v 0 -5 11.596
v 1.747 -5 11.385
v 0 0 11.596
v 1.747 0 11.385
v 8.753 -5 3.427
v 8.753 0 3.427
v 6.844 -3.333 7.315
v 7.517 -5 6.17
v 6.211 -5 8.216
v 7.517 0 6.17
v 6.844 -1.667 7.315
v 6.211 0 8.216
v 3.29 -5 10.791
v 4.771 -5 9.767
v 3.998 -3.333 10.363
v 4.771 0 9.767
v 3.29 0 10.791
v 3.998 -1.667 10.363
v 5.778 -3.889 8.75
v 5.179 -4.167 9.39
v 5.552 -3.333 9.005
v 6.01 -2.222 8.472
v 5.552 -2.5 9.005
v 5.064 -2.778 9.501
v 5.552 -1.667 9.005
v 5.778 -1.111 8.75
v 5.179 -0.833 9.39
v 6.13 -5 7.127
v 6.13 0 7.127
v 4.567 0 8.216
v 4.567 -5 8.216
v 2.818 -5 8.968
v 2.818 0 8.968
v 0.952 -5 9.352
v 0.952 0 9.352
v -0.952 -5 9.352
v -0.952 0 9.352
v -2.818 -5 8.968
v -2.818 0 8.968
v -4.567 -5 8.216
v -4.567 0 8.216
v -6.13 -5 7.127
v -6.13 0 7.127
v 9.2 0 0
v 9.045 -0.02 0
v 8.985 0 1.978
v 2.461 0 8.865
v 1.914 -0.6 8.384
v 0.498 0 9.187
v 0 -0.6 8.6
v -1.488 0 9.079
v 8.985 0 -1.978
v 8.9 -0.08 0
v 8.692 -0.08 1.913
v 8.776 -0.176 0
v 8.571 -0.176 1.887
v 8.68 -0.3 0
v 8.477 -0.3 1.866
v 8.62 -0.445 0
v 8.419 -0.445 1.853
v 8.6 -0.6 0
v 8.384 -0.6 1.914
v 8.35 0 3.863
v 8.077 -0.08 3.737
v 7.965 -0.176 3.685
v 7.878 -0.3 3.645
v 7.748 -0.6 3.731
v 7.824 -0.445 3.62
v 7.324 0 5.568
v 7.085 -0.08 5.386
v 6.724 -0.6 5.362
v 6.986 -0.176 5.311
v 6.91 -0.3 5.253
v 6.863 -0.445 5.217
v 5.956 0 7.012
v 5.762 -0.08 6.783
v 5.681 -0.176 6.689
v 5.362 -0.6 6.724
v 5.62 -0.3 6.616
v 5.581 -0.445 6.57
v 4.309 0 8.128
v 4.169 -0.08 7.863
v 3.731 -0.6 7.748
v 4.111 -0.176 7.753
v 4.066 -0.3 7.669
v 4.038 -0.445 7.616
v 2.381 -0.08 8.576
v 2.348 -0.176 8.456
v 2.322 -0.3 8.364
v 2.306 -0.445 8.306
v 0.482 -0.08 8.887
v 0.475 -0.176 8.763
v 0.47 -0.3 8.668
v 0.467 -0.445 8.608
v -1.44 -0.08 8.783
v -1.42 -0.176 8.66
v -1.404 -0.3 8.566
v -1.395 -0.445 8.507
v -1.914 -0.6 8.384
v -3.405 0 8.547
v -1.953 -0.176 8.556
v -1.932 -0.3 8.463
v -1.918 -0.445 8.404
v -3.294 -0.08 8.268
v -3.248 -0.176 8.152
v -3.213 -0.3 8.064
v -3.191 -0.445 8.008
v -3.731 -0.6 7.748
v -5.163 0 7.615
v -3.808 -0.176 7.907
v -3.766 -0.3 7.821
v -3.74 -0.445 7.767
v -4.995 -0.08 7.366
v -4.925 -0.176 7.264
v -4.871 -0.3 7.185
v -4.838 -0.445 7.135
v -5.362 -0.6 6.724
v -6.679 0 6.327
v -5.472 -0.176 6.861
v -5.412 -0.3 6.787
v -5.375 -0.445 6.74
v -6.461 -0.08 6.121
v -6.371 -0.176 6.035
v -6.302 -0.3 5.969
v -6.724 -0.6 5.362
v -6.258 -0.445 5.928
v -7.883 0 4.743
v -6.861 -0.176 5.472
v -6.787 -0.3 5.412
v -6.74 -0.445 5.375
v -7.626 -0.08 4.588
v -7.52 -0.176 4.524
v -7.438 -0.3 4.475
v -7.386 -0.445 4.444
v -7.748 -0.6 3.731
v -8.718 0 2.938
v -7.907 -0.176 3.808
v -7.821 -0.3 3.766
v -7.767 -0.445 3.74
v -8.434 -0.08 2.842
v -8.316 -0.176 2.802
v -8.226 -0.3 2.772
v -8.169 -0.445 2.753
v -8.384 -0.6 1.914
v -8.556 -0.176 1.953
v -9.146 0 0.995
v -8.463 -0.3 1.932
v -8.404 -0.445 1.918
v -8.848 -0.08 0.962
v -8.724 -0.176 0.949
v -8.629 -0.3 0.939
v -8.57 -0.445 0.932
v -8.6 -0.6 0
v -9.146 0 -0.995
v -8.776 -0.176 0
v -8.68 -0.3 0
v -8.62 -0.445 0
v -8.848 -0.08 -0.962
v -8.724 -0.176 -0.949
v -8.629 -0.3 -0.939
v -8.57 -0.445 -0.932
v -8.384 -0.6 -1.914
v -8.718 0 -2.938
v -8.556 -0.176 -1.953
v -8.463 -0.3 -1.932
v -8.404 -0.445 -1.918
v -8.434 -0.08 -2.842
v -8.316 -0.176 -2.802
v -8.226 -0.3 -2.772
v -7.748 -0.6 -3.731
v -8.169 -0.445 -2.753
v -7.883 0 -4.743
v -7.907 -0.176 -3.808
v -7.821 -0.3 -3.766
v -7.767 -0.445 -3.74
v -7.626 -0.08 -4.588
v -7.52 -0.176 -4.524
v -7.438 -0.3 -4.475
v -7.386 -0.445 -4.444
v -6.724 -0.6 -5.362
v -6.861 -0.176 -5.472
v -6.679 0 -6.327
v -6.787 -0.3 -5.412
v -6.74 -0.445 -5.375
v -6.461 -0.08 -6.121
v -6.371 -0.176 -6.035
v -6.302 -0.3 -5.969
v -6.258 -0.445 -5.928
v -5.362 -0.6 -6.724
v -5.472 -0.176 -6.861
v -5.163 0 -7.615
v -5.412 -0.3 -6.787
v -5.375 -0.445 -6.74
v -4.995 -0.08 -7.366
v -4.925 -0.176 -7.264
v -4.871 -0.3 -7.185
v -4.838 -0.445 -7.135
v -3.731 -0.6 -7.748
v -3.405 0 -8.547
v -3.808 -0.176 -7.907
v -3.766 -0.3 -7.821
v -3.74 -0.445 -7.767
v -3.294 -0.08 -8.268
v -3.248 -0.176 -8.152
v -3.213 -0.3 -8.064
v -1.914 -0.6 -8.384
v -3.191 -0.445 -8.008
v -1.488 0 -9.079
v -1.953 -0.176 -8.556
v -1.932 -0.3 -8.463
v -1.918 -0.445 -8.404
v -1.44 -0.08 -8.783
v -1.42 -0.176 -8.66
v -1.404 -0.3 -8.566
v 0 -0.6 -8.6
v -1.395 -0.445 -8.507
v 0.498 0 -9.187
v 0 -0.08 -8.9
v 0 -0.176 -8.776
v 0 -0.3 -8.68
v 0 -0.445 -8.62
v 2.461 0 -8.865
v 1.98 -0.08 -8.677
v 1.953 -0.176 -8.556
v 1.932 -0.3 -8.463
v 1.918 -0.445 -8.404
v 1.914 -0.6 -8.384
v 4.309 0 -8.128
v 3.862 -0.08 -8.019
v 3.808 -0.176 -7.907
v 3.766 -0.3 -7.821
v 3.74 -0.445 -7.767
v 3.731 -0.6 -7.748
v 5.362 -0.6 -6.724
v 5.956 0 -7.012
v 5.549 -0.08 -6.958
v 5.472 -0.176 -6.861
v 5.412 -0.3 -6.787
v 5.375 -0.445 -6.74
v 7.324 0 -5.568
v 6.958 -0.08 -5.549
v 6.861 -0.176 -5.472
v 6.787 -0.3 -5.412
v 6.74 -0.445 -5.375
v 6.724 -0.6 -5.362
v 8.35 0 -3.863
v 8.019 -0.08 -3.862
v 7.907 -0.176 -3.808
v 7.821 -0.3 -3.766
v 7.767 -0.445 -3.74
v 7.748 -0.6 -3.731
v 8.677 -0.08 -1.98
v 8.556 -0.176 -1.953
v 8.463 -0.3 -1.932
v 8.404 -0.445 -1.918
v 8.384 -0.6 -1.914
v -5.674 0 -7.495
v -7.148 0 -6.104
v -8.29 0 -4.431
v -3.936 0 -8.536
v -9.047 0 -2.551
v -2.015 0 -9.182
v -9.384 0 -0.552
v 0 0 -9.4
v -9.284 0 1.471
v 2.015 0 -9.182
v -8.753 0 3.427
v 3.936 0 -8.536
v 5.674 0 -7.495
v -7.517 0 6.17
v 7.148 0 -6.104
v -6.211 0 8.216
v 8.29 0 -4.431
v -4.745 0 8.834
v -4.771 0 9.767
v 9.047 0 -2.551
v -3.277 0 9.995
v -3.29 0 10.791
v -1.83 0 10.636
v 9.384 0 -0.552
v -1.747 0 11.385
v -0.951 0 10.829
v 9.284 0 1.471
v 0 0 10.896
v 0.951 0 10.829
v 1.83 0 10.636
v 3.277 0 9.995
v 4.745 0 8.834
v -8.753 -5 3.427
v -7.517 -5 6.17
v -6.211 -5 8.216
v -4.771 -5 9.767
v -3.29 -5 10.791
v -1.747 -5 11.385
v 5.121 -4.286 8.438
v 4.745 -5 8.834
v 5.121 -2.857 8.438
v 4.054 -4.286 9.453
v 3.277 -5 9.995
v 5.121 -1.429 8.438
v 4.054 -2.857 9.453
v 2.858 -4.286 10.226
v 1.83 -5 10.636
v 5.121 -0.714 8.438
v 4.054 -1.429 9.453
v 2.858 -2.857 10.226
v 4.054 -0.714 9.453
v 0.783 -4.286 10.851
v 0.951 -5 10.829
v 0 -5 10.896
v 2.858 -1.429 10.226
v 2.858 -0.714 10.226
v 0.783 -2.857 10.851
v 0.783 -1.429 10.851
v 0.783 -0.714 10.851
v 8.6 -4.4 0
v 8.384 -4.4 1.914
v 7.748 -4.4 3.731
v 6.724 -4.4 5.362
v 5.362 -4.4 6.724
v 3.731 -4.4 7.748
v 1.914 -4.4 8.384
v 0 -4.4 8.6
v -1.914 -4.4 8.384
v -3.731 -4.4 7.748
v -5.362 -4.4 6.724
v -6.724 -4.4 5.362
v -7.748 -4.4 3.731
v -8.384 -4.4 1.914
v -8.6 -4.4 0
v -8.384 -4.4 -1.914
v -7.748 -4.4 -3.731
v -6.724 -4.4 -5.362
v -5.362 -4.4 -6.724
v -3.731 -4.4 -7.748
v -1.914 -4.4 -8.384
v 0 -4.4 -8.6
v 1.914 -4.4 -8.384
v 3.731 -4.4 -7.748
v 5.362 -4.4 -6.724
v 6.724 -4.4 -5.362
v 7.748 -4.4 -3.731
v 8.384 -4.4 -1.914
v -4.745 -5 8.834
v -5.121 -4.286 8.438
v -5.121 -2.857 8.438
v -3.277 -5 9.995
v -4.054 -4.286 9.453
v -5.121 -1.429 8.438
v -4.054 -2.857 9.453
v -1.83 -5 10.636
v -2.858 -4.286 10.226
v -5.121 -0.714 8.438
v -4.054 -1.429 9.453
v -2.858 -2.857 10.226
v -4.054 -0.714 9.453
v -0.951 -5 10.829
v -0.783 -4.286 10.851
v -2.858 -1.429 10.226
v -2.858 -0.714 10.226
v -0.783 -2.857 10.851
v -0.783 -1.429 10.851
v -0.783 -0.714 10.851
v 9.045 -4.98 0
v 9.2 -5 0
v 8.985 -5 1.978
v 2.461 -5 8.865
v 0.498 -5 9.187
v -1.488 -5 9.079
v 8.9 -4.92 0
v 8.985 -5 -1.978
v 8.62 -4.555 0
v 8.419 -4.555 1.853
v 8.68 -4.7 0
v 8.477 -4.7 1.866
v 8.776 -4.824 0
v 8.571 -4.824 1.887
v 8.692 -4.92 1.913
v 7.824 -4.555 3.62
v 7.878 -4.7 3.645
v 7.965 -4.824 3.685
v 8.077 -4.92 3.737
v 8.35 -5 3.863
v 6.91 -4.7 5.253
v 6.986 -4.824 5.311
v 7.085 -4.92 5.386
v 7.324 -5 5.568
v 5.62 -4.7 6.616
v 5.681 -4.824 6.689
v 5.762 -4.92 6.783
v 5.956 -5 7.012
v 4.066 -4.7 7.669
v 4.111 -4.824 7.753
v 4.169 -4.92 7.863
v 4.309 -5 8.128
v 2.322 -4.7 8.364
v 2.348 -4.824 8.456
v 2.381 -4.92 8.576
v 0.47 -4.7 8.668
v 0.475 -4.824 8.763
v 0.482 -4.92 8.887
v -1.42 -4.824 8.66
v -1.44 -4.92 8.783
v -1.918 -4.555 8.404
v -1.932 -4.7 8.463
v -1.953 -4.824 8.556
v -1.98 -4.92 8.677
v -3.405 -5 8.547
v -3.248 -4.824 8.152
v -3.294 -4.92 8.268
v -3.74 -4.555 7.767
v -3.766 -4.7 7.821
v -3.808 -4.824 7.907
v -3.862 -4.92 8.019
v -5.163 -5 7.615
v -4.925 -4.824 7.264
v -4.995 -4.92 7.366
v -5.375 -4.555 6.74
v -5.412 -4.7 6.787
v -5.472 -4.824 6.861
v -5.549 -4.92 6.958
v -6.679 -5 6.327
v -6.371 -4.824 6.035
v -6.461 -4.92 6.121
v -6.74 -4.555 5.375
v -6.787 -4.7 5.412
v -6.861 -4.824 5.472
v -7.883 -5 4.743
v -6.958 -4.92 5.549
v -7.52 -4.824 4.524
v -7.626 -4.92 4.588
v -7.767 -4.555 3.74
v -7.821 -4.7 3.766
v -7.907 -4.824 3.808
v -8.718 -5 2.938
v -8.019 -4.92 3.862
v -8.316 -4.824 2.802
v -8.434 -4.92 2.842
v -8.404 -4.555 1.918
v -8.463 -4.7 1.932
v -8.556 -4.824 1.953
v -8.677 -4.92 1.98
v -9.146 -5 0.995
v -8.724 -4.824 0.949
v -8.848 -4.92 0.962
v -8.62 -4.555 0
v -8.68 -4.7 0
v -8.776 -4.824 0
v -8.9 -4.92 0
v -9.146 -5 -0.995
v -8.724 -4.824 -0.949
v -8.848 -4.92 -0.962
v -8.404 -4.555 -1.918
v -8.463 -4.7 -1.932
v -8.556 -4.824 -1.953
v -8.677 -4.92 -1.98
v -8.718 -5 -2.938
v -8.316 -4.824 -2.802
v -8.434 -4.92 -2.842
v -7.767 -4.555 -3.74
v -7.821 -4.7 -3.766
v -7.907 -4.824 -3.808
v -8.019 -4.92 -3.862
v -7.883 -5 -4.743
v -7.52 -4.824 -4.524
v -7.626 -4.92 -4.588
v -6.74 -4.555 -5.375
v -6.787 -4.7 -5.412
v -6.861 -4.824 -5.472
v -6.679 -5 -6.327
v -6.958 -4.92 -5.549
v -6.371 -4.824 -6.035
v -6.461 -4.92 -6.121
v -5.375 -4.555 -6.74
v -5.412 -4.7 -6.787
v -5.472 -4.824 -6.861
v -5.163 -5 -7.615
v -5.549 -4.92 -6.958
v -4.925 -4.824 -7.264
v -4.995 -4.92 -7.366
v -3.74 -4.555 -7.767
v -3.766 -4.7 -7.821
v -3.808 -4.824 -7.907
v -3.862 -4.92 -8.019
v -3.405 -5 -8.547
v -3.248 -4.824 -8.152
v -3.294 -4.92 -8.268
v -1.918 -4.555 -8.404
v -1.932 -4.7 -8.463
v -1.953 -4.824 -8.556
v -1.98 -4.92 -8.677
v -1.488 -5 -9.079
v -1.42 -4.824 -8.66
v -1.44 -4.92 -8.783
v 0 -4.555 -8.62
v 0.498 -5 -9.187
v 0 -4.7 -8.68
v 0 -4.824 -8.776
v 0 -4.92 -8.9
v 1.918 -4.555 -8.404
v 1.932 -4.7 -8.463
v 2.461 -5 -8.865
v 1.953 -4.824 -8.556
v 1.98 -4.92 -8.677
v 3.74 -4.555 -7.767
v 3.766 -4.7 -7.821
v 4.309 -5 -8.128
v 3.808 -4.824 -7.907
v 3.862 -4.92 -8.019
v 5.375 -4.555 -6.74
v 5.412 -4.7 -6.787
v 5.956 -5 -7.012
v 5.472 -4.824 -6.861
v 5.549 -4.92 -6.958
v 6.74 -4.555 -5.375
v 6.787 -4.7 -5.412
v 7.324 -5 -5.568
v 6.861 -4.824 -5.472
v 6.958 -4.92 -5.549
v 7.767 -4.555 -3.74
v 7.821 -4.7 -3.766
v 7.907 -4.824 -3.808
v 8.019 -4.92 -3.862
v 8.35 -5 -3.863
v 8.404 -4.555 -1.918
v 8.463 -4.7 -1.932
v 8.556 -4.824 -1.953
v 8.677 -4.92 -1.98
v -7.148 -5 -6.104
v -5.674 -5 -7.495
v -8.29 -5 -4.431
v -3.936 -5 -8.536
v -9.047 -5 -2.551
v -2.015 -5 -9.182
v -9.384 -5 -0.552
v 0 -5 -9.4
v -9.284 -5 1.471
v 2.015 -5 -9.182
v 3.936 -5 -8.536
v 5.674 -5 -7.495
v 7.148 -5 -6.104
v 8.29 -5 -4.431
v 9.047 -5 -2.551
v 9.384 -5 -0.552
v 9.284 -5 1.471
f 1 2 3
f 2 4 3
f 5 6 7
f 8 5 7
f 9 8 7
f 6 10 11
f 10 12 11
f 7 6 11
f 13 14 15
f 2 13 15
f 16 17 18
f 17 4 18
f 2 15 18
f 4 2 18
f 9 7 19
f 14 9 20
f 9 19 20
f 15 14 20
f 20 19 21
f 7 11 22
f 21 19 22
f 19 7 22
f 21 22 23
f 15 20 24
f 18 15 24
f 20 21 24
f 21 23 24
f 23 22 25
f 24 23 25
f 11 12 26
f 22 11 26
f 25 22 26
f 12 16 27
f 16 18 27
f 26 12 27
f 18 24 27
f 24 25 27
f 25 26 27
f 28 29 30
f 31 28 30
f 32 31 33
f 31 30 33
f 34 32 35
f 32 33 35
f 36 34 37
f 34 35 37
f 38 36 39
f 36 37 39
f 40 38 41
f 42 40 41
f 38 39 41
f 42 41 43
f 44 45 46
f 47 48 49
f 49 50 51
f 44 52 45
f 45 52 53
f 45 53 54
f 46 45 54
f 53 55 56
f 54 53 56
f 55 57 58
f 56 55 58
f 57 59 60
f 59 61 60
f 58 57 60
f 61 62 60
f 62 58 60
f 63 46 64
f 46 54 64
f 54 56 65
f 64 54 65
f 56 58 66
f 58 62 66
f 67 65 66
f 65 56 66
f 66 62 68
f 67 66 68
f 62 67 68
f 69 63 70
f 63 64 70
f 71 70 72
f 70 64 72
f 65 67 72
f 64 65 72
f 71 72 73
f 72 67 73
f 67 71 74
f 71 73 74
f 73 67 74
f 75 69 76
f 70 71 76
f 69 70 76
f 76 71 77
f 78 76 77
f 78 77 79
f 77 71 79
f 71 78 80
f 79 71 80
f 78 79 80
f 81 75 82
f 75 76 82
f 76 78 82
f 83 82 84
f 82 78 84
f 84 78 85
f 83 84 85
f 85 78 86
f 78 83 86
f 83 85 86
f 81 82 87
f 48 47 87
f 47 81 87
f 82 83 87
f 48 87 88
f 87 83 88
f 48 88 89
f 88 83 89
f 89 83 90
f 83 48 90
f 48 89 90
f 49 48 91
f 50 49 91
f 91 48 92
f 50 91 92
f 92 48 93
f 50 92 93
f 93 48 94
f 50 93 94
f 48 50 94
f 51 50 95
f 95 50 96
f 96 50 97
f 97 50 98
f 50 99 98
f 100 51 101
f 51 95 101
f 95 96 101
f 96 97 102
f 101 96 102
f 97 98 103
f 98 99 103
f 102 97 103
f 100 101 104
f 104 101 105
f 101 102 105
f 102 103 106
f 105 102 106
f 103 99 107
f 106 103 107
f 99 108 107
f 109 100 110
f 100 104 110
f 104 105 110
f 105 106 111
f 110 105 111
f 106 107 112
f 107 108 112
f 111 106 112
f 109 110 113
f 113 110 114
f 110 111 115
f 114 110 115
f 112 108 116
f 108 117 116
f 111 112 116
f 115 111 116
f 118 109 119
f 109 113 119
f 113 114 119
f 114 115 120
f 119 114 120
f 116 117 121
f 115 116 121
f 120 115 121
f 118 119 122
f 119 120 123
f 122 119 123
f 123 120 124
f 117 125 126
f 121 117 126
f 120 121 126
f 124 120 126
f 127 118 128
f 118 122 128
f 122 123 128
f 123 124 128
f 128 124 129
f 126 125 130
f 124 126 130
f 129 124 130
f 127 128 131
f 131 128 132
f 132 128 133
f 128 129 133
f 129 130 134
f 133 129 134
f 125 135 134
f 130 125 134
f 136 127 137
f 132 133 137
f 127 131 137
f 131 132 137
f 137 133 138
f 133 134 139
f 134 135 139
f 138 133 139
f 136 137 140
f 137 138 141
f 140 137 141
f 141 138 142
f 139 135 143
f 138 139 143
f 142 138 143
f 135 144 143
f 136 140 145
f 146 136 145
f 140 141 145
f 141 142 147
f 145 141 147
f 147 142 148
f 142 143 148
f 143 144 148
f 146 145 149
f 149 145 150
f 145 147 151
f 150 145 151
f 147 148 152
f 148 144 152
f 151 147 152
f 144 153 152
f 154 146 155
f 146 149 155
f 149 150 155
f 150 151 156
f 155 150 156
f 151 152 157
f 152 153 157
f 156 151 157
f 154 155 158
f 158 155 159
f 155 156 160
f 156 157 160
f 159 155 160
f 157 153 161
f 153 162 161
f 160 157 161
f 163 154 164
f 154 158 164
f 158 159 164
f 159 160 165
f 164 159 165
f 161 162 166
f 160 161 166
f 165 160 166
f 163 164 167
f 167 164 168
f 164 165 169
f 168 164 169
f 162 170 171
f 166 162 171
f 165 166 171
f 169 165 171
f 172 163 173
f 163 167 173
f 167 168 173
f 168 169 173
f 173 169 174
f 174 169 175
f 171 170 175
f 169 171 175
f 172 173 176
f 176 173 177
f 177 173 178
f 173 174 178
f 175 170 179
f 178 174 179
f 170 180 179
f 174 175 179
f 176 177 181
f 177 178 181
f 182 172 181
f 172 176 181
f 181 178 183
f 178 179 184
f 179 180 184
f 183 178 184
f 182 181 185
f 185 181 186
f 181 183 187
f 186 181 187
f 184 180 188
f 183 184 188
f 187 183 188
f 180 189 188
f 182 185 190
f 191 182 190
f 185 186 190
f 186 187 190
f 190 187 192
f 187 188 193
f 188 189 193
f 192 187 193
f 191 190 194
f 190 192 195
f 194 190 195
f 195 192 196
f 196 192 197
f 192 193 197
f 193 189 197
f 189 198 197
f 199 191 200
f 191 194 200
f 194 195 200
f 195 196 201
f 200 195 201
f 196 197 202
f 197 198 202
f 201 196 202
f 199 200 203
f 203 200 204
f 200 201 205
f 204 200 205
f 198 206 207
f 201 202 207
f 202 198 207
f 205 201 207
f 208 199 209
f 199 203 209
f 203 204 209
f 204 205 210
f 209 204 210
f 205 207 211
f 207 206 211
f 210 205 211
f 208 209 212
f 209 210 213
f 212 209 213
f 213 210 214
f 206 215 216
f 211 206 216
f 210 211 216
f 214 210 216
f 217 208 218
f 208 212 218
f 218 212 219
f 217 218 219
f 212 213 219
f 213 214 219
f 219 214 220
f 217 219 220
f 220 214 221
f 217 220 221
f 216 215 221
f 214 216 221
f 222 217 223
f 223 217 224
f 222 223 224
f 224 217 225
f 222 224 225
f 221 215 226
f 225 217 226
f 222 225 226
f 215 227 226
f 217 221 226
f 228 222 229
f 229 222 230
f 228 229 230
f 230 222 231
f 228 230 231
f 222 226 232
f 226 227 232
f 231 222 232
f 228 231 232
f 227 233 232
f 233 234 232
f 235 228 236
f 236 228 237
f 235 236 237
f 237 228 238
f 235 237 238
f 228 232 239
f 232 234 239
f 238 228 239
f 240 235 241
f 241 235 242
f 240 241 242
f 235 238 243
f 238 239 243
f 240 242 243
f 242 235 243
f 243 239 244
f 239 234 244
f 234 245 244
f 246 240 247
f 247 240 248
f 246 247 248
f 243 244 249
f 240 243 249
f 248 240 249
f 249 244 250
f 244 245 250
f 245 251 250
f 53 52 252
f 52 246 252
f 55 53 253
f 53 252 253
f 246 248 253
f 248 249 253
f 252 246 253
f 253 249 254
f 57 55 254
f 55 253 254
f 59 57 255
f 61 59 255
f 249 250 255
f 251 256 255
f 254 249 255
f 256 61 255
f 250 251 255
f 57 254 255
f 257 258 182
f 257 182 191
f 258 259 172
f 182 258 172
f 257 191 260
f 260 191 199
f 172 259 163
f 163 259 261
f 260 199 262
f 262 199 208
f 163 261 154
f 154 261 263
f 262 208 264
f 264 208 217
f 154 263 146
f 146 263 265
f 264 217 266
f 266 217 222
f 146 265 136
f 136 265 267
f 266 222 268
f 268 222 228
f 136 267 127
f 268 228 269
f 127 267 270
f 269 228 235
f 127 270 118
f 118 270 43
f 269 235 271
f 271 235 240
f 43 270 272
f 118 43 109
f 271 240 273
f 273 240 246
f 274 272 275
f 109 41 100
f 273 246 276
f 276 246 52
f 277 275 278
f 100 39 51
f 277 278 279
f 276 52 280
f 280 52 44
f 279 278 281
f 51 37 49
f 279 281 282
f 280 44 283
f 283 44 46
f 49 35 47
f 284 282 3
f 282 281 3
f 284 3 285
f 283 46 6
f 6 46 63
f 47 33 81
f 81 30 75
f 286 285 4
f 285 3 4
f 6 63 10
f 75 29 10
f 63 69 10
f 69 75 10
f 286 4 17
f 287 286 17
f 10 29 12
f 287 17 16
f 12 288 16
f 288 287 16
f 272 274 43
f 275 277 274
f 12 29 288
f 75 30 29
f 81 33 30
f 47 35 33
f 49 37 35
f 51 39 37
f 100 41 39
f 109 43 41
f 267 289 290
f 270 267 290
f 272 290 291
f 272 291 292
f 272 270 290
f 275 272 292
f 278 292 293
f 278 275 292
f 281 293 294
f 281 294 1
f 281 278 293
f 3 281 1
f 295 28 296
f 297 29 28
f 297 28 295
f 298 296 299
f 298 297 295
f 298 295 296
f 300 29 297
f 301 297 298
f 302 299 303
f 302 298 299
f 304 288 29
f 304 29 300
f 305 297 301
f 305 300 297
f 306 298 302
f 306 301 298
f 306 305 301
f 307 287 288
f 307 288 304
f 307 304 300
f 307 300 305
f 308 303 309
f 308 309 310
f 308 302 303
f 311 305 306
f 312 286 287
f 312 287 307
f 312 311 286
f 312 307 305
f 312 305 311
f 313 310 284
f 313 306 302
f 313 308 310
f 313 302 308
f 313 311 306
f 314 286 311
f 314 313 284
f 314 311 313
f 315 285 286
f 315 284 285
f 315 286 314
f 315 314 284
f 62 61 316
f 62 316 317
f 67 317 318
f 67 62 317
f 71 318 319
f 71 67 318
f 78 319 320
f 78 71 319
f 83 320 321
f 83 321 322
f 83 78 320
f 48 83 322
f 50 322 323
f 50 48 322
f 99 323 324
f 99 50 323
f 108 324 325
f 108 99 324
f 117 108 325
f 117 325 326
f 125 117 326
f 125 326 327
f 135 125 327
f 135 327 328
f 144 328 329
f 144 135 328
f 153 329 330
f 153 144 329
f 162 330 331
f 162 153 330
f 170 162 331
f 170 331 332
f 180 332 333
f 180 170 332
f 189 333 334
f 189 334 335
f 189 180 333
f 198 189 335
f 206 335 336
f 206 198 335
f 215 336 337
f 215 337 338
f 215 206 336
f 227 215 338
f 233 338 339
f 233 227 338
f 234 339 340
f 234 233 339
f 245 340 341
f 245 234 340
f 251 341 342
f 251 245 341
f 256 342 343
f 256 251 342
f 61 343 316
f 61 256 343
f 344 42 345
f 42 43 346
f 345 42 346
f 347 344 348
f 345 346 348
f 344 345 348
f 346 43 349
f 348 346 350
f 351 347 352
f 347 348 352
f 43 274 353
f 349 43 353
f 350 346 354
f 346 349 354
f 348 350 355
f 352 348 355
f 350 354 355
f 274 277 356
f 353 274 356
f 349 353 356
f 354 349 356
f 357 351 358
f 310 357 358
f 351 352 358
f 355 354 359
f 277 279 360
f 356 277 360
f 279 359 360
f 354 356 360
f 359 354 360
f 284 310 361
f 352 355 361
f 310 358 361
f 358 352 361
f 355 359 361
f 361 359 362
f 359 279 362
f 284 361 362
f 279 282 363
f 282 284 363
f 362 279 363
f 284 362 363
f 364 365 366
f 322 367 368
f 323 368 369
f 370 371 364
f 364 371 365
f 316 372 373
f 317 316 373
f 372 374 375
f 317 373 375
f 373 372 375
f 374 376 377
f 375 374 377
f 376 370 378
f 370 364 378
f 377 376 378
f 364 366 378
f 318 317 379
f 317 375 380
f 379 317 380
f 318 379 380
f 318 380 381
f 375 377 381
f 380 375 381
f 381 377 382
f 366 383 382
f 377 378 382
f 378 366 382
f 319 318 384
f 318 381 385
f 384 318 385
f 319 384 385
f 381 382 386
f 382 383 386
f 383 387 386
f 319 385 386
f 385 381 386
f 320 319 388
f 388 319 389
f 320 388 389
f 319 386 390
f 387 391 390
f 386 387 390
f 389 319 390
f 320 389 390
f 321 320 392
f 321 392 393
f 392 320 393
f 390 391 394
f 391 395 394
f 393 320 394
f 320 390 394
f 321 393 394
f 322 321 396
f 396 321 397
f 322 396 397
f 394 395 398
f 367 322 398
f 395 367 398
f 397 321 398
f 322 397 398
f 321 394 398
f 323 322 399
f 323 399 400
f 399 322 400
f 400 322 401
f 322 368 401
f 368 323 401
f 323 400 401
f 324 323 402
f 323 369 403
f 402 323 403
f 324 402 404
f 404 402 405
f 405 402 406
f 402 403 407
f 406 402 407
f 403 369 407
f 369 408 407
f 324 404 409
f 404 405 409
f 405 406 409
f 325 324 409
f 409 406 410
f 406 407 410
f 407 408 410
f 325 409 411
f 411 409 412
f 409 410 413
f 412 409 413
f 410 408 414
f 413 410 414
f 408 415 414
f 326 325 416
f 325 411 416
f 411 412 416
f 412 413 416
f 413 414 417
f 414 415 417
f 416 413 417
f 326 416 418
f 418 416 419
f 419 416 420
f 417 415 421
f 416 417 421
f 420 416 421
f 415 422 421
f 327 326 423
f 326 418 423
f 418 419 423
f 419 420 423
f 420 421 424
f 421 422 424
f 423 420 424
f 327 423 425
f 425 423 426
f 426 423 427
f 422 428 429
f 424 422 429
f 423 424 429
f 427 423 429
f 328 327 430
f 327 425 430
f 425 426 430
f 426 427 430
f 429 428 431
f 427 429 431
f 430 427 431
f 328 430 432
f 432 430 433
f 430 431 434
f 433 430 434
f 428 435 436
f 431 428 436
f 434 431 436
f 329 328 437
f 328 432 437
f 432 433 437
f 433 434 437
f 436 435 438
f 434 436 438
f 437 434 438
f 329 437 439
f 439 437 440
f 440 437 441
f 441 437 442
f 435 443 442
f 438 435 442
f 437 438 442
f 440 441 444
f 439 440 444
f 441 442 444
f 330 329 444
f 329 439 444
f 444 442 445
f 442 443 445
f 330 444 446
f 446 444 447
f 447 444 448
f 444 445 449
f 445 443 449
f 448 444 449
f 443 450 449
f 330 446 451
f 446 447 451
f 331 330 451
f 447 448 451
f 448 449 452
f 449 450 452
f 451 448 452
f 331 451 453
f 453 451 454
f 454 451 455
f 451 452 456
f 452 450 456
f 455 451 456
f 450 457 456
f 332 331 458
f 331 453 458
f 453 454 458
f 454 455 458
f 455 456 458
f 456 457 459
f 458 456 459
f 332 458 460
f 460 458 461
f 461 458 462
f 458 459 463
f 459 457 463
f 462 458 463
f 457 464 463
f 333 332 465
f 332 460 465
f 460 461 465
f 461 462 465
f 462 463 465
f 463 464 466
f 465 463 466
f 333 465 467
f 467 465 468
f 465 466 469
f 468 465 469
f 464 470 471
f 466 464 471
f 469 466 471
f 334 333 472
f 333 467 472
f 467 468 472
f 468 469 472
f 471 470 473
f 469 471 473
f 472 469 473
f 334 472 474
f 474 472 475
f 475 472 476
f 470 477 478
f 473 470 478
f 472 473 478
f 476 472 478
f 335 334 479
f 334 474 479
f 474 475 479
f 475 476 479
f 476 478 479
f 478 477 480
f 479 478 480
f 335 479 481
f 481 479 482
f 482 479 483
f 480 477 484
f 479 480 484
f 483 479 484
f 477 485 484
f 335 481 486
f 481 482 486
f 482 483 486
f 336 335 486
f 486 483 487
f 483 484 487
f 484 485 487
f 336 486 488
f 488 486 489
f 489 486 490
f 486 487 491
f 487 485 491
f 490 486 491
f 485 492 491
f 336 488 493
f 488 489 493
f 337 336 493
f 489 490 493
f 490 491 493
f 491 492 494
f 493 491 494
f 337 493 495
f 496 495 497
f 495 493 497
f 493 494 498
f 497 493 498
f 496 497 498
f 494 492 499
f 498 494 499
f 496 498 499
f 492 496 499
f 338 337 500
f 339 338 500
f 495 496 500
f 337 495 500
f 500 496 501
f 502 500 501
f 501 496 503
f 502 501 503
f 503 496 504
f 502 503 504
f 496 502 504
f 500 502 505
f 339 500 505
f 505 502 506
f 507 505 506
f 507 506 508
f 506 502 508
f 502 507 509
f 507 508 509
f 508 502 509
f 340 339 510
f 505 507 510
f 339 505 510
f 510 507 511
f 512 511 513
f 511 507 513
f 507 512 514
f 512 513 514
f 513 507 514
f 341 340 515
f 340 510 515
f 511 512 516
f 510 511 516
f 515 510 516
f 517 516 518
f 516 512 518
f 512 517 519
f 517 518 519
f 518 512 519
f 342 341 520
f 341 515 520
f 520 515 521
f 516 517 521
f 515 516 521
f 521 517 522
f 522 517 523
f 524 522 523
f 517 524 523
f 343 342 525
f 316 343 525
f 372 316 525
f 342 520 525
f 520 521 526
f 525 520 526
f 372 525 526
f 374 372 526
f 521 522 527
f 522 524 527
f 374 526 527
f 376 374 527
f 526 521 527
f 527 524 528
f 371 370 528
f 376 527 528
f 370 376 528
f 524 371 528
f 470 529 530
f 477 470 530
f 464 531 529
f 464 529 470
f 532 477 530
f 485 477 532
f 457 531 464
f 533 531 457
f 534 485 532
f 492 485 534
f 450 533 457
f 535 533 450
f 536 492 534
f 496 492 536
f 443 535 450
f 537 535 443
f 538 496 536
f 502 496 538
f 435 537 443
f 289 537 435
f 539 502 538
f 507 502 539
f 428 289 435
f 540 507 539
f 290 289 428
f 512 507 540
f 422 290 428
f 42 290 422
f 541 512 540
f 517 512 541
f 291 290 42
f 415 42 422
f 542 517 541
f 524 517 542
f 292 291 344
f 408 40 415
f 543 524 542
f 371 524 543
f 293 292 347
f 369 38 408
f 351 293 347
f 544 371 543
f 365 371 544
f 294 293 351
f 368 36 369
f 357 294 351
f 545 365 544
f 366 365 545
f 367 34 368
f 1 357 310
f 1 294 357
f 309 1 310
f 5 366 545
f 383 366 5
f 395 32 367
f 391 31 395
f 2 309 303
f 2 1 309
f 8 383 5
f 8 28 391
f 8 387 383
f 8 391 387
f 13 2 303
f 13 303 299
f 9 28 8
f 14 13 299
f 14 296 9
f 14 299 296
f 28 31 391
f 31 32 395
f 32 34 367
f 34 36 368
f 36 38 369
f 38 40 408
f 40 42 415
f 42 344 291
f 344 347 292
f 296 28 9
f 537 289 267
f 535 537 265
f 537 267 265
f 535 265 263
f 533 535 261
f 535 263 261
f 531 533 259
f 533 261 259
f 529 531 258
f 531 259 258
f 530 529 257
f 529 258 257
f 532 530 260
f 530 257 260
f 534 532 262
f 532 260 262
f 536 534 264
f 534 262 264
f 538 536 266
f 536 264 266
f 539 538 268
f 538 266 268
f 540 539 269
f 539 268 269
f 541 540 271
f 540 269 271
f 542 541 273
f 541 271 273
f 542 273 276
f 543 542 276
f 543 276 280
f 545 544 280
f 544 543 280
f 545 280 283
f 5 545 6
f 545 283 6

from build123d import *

# Parameters (mm, degrees)
F0_R     = 9.4
F0_R_2   = 8.6
F1_DEPTH = 5
F3_DEPTH = 5
F4_R     = 0.6


# Not quite as in the source:
# - the dataset's text gives a spline's control points without its knots; the knots are read off the source's solid


with BuildPart() as f1:
    # F0 (on Front) → F1 (new body)
    with BuildSketch(Plane.XZ):
        Circle(F0_R)
        Circle(F0_R_2, mode=Mode.SUBTRACT)
    extrude(amount=F1_DEPTH)

    # F2 (on Front) → F3 (join)
    with BuildSketch(Plane.XZ):
        with BuildLine():
            add(Edge.make_bspline(
                [(-8.8490276873, 3.1709161121), (-7.3496829409, 7.2272375548), (-4.746891386, 11.5964177027), (3.78631e-05, 11.5964002776), (5.67948e-05, 11.5964002775)],
                knots=[0, 0, 0, 0, 0.5, 0.5000019941, 0.5000019941, 0.5000019941, 0.5000019941], degree=3))
            Line((-8.8490276873, 3.1709161121), (-8.1924457198, 2.9282226429))
            add(Edge.make_bspline(
                [(-8.1924457198, 2.9282226429), (-7.8262756691, 3.9188576733), (-6.9626502108, 5.9278467604), (-5.4967702335, 8.1305819439), (-4.0755610615, 9.4931807293), (-2.8820227839, 10.2720641504), (-1.7694285607, 10.6893985819), (-0.7912754674, 10.8653850416), (-0.2703531008, 10.896417707), (0, 10.8964002777)],
                knots=[0, 0, 0, 0, 0.125, 0.25, 0.3125, 0.375, 0.4375, 0.46875, 0.5, 0.5, 0.5, 0.5], degree=3))
            add(Edge.make_bspline(
                [(8.1924457198, 2.9282226429), (7.8262756691, 3.9188576733), (6.9626502108, 5.9278467604), (5.4967702335, 8.1305819439), (4.0755610615, 9.4931807293), (2.8820227839, 10.2720641504), (1.7694285607, 10.6893985819), (0.7912754674, 10.8653850416), (0.2703531008, 10.896417707), (0, 10.8964002777)],
                knots=[0, 0, 0, 0, 0.125, 0.25, 0.3125, 0.375, 0.4375, 0.46875, 0.5, 0.5, 0.5, 0.5], degree=3))
            Line((8.1924457198, 2.9282226429), (8.8490276873, 3.1709161121))
            add(Edge.make_bspline(
                [(8.8490276873, 3.1709161121), (7.3496889206, 7.2272213774), (4.7469225273, 11.5963654275), (5.67948e-05, 11.5964002775)],
                knots=[0, 0, 0, 0, 0.4999980059, 0.4999980059, 0.4999980059, 0.4999980059], degree=3))
        make_face()
    extrude(amount=F3_DEPTH)

    # F4
    f4_edges = [f1.edges().sort_by_distance(p)[0] for p in [
        (-8.6, -5, 0),
        (-8.6, 0, 0),
    ]]
    fillet(f4_edges, radius=F4_R)


solid = f1.part
